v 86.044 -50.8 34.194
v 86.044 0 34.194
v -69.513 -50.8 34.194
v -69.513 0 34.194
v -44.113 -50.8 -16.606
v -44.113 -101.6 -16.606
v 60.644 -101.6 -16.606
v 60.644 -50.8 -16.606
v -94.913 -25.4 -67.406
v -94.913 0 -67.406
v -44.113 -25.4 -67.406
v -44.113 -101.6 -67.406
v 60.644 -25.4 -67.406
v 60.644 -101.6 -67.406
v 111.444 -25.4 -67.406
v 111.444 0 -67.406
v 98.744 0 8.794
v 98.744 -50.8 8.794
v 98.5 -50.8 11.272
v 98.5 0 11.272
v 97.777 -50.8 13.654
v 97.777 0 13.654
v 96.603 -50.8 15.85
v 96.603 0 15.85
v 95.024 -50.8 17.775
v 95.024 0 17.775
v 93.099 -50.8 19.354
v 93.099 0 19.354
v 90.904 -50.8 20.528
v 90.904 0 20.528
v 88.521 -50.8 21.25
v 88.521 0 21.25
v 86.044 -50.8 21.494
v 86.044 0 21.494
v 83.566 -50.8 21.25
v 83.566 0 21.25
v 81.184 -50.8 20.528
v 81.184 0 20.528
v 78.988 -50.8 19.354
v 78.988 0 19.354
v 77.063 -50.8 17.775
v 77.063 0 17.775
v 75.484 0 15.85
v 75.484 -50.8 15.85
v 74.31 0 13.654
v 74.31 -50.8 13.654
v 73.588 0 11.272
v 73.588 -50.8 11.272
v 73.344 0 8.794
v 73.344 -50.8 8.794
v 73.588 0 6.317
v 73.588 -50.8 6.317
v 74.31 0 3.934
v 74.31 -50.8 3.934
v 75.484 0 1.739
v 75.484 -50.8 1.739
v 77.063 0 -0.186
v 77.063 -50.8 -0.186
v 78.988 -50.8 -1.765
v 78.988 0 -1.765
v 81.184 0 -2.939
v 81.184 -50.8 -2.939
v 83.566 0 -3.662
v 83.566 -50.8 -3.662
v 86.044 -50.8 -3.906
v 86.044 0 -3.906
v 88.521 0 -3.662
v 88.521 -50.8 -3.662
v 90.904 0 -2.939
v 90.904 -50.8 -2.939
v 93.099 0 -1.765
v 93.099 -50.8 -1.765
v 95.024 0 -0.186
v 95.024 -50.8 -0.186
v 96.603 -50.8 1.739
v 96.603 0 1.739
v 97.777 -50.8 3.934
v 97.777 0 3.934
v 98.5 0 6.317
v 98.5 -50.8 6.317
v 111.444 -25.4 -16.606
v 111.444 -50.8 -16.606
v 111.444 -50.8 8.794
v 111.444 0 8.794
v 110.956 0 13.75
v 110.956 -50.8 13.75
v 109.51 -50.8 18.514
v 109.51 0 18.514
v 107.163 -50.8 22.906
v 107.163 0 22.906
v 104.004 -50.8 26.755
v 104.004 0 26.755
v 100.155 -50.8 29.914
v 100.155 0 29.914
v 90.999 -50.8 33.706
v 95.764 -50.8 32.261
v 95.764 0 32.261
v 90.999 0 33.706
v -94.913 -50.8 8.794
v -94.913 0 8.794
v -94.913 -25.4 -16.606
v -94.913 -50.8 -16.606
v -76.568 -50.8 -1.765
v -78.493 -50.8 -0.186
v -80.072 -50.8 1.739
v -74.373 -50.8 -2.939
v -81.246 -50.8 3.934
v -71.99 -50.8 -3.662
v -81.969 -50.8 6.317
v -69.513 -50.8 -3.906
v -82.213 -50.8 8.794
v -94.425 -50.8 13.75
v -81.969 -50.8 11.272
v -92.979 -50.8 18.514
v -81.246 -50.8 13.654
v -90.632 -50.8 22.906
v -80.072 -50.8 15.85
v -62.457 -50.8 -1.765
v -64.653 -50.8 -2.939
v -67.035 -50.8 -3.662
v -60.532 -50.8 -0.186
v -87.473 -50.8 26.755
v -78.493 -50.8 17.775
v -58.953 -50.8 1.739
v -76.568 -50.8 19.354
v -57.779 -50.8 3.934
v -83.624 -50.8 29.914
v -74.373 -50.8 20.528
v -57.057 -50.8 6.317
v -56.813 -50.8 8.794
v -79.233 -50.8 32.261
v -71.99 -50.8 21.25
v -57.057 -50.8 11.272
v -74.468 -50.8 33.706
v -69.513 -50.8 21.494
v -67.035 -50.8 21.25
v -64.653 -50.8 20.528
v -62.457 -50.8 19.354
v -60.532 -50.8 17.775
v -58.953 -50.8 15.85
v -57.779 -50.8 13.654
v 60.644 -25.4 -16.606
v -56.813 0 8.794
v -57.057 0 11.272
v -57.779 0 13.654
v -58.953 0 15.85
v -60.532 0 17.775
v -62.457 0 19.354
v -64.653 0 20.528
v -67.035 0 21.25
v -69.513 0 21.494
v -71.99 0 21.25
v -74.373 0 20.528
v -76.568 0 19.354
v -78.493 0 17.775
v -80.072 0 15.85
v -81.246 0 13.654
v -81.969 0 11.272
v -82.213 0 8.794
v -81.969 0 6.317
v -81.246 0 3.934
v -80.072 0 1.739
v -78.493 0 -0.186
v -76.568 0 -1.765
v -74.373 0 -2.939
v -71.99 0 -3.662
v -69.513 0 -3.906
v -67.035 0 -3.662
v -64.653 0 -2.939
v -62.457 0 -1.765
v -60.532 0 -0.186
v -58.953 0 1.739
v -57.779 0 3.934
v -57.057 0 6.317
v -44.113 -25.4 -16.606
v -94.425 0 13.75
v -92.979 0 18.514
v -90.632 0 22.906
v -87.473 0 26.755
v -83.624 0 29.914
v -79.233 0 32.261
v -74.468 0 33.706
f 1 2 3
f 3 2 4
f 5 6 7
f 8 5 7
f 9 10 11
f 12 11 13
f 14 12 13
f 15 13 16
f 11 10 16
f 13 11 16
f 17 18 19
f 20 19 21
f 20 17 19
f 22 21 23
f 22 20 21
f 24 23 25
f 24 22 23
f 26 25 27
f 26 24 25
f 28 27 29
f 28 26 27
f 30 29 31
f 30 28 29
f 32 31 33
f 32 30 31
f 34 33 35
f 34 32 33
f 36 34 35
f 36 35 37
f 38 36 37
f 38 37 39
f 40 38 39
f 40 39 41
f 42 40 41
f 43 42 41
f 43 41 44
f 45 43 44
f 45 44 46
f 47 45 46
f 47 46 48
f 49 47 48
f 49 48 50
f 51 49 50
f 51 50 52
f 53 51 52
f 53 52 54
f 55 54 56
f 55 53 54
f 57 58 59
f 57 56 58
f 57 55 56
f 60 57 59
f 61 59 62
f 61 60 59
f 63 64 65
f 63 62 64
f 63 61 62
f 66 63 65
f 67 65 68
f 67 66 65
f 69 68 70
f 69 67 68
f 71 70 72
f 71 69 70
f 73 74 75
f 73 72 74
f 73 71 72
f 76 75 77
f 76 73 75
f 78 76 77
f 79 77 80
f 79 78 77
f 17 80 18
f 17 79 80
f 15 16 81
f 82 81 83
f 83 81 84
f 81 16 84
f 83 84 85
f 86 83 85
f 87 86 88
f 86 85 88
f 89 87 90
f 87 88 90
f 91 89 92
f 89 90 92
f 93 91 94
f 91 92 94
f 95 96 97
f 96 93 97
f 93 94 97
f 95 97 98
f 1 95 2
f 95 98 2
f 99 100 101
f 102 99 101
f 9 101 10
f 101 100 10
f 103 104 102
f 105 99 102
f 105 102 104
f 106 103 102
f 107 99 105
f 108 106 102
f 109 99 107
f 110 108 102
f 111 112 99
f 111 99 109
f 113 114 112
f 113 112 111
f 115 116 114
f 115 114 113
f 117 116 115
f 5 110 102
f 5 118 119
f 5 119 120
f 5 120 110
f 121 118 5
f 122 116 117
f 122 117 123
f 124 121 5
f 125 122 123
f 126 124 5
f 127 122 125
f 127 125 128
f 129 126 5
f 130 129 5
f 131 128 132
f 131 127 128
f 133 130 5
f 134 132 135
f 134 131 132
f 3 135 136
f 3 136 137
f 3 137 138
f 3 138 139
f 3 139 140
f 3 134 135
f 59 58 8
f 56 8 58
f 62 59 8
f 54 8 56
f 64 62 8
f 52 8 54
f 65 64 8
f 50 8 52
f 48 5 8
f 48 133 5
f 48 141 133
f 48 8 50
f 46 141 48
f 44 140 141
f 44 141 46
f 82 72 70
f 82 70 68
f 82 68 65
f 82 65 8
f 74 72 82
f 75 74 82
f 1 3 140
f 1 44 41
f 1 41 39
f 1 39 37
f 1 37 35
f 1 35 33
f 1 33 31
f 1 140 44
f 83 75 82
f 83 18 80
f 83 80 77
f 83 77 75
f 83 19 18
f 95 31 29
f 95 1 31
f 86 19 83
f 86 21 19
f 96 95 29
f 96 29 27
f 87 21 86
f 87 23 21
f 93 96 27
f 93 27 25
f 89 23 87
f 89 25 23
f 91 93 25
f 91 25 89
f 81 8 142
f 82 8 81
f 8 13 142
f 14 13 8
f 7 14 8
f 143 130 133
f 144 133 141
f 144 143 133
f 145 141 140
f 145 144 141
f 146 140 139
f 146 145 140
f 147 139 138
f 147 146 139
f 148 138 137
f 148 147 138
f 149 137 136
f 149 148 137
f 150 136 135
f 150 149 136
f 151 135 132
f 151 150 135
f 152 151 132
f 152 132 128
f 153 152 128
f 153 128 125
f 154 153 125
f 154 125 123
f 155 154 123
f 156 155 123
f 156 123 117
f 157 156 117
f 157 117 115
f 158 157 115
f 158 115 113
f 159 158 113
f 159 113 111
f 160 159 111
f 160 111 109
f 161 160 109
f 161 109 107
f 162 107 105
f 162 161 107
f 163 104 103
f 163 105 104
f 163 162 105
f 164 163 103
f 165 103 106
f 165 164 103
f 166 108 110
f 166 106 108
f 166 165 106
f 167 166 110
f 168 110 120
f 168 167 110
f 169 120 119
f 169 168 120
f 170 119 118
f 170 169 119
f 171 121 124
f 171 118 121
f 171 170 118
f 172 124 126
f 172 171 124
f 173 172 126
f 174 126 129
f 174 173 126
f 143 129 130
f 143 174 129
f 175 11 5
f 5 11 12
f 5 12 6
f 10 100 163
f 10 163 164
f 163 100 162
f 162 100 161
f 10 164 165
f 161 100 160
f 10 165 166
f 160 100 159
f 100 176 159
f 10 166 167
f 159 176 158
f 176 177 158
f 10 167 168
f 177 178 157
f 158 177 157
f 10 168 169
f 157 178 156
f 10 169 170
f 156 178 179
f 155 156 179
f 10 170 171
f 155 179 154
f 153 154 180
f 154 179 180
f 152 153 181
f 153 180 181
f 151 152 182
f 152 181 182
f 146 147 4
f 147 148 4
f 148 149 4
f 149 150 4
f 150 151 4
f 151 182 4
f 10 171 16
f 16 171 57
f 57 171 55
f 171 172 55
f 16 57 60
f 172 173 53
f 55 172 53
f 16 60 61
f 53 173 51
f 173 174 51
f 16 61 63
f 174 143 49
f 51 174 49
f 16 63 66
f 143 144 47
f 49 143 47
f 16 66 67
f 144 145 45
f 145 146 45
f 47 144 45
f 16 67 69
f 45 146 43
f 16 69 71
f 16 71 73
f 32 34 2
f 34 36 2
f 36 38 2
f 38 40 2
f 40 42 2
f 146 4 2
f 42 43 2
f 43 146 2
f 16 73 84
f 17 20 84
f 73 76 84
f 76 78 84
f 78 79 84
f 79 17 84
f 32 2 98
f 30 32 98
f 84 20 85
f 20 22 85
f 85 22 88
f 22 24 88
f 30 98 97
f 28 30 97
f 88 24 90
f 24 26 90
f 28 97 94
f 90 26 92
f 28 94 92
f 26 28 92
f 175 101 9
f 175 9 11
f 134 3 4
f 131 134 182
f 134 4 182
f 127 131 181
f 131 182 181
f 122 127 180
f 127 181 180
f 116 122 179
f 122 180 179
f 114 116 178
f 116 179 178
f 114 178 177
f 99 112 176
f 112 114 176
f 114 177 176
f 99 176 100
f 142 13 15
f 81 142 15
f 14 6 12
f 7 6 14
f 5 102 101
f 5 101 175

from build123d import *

# Parameters (mm, degrees)
F0_R     = 12.7
F1_DEPTH = 101.6
F2_W     = 50.8
F2_H     = 50.8
F3_DEPTH = 76.2
F4_W     = 180.9563313782
F4_H     = 50.8
F5_DEPTH = 50.8
F6_W     = 50.8
F6_H     = 50.8
F7_DEPTH = 203.2


with BuildPart() as f1:
    # F0 (on Front) → F1 (new body)
    with BuildSketch(Plane.XZ):
        with BuildLine():
            Line((86.0436633229, 34.1943300605), (-69.5126680553, 34.1943300605))
            ThreePointArc((-69.5126680553, 34.1943300605), (-87.4731802974, 26.7548423026), (-94.9126680553, 8.7943300605))
            Line((-94.9126680553, 8.7943300605), (-94.9126680553, -67.4056699395))
            Line((-94.9126680553, -67.4056699395), (111.4436633229, -67.4056699395))
            Line((111.4436633229, -67.4056699395), (111.4436633229, 8.7943300605))
            ThreePointArc((111.4436633229, 8.7943300605), (104.0041755651, 26.7548423026), (86.0436633229, 34.1943300605))
        make_face()
        with Locations((-69.5126680553, 8.7943300605)):
            Circle(F0_R, mode=Mode.SUBTRACT)
        with Locations((86.0436633229, 8.7943300605)):
            Circle(F0_R, mode=Mode.SUBTRACT)
    extrude(amount=F1_DEPTH)

    # F2 (on face) → F3 (cut)
    with BuildSketch(Plane.XZ.offset(101.6)):
        with Locations((-69.5126680553, -42.0056699395)):
            Rectangle(F2_W, F2_H)
        with Locations((86.0436633229, -42.0056699395)):
            Rectangle(F2_W, F2_H)
    extrude(amount=-F3_DEPTH, mode=Mode.SUBTRACT)

    # F4 (on face) → F5 (cut)
    with BuildSketch(Plane.XZ.offset(101.6)):
        with Locations((20.9654976338, 8.7943300605)):
            Rectangle(F4_W, F4_H)
    extrude(amount=-F5_DEPTH, mode=Mode.SUBTRACT)

    # F6 (on face) → F7 (cut)
    with BuildSketch(Plane.YZ.offset(-69.5126680553)):
        with Locations((-76.2, 8.7943300605)):
            Rectangle(F6_W, F6_H)
    extrude(amount=-F7_DEPTH, mode=Mode.SUBTRACT)


solid = f1.part
